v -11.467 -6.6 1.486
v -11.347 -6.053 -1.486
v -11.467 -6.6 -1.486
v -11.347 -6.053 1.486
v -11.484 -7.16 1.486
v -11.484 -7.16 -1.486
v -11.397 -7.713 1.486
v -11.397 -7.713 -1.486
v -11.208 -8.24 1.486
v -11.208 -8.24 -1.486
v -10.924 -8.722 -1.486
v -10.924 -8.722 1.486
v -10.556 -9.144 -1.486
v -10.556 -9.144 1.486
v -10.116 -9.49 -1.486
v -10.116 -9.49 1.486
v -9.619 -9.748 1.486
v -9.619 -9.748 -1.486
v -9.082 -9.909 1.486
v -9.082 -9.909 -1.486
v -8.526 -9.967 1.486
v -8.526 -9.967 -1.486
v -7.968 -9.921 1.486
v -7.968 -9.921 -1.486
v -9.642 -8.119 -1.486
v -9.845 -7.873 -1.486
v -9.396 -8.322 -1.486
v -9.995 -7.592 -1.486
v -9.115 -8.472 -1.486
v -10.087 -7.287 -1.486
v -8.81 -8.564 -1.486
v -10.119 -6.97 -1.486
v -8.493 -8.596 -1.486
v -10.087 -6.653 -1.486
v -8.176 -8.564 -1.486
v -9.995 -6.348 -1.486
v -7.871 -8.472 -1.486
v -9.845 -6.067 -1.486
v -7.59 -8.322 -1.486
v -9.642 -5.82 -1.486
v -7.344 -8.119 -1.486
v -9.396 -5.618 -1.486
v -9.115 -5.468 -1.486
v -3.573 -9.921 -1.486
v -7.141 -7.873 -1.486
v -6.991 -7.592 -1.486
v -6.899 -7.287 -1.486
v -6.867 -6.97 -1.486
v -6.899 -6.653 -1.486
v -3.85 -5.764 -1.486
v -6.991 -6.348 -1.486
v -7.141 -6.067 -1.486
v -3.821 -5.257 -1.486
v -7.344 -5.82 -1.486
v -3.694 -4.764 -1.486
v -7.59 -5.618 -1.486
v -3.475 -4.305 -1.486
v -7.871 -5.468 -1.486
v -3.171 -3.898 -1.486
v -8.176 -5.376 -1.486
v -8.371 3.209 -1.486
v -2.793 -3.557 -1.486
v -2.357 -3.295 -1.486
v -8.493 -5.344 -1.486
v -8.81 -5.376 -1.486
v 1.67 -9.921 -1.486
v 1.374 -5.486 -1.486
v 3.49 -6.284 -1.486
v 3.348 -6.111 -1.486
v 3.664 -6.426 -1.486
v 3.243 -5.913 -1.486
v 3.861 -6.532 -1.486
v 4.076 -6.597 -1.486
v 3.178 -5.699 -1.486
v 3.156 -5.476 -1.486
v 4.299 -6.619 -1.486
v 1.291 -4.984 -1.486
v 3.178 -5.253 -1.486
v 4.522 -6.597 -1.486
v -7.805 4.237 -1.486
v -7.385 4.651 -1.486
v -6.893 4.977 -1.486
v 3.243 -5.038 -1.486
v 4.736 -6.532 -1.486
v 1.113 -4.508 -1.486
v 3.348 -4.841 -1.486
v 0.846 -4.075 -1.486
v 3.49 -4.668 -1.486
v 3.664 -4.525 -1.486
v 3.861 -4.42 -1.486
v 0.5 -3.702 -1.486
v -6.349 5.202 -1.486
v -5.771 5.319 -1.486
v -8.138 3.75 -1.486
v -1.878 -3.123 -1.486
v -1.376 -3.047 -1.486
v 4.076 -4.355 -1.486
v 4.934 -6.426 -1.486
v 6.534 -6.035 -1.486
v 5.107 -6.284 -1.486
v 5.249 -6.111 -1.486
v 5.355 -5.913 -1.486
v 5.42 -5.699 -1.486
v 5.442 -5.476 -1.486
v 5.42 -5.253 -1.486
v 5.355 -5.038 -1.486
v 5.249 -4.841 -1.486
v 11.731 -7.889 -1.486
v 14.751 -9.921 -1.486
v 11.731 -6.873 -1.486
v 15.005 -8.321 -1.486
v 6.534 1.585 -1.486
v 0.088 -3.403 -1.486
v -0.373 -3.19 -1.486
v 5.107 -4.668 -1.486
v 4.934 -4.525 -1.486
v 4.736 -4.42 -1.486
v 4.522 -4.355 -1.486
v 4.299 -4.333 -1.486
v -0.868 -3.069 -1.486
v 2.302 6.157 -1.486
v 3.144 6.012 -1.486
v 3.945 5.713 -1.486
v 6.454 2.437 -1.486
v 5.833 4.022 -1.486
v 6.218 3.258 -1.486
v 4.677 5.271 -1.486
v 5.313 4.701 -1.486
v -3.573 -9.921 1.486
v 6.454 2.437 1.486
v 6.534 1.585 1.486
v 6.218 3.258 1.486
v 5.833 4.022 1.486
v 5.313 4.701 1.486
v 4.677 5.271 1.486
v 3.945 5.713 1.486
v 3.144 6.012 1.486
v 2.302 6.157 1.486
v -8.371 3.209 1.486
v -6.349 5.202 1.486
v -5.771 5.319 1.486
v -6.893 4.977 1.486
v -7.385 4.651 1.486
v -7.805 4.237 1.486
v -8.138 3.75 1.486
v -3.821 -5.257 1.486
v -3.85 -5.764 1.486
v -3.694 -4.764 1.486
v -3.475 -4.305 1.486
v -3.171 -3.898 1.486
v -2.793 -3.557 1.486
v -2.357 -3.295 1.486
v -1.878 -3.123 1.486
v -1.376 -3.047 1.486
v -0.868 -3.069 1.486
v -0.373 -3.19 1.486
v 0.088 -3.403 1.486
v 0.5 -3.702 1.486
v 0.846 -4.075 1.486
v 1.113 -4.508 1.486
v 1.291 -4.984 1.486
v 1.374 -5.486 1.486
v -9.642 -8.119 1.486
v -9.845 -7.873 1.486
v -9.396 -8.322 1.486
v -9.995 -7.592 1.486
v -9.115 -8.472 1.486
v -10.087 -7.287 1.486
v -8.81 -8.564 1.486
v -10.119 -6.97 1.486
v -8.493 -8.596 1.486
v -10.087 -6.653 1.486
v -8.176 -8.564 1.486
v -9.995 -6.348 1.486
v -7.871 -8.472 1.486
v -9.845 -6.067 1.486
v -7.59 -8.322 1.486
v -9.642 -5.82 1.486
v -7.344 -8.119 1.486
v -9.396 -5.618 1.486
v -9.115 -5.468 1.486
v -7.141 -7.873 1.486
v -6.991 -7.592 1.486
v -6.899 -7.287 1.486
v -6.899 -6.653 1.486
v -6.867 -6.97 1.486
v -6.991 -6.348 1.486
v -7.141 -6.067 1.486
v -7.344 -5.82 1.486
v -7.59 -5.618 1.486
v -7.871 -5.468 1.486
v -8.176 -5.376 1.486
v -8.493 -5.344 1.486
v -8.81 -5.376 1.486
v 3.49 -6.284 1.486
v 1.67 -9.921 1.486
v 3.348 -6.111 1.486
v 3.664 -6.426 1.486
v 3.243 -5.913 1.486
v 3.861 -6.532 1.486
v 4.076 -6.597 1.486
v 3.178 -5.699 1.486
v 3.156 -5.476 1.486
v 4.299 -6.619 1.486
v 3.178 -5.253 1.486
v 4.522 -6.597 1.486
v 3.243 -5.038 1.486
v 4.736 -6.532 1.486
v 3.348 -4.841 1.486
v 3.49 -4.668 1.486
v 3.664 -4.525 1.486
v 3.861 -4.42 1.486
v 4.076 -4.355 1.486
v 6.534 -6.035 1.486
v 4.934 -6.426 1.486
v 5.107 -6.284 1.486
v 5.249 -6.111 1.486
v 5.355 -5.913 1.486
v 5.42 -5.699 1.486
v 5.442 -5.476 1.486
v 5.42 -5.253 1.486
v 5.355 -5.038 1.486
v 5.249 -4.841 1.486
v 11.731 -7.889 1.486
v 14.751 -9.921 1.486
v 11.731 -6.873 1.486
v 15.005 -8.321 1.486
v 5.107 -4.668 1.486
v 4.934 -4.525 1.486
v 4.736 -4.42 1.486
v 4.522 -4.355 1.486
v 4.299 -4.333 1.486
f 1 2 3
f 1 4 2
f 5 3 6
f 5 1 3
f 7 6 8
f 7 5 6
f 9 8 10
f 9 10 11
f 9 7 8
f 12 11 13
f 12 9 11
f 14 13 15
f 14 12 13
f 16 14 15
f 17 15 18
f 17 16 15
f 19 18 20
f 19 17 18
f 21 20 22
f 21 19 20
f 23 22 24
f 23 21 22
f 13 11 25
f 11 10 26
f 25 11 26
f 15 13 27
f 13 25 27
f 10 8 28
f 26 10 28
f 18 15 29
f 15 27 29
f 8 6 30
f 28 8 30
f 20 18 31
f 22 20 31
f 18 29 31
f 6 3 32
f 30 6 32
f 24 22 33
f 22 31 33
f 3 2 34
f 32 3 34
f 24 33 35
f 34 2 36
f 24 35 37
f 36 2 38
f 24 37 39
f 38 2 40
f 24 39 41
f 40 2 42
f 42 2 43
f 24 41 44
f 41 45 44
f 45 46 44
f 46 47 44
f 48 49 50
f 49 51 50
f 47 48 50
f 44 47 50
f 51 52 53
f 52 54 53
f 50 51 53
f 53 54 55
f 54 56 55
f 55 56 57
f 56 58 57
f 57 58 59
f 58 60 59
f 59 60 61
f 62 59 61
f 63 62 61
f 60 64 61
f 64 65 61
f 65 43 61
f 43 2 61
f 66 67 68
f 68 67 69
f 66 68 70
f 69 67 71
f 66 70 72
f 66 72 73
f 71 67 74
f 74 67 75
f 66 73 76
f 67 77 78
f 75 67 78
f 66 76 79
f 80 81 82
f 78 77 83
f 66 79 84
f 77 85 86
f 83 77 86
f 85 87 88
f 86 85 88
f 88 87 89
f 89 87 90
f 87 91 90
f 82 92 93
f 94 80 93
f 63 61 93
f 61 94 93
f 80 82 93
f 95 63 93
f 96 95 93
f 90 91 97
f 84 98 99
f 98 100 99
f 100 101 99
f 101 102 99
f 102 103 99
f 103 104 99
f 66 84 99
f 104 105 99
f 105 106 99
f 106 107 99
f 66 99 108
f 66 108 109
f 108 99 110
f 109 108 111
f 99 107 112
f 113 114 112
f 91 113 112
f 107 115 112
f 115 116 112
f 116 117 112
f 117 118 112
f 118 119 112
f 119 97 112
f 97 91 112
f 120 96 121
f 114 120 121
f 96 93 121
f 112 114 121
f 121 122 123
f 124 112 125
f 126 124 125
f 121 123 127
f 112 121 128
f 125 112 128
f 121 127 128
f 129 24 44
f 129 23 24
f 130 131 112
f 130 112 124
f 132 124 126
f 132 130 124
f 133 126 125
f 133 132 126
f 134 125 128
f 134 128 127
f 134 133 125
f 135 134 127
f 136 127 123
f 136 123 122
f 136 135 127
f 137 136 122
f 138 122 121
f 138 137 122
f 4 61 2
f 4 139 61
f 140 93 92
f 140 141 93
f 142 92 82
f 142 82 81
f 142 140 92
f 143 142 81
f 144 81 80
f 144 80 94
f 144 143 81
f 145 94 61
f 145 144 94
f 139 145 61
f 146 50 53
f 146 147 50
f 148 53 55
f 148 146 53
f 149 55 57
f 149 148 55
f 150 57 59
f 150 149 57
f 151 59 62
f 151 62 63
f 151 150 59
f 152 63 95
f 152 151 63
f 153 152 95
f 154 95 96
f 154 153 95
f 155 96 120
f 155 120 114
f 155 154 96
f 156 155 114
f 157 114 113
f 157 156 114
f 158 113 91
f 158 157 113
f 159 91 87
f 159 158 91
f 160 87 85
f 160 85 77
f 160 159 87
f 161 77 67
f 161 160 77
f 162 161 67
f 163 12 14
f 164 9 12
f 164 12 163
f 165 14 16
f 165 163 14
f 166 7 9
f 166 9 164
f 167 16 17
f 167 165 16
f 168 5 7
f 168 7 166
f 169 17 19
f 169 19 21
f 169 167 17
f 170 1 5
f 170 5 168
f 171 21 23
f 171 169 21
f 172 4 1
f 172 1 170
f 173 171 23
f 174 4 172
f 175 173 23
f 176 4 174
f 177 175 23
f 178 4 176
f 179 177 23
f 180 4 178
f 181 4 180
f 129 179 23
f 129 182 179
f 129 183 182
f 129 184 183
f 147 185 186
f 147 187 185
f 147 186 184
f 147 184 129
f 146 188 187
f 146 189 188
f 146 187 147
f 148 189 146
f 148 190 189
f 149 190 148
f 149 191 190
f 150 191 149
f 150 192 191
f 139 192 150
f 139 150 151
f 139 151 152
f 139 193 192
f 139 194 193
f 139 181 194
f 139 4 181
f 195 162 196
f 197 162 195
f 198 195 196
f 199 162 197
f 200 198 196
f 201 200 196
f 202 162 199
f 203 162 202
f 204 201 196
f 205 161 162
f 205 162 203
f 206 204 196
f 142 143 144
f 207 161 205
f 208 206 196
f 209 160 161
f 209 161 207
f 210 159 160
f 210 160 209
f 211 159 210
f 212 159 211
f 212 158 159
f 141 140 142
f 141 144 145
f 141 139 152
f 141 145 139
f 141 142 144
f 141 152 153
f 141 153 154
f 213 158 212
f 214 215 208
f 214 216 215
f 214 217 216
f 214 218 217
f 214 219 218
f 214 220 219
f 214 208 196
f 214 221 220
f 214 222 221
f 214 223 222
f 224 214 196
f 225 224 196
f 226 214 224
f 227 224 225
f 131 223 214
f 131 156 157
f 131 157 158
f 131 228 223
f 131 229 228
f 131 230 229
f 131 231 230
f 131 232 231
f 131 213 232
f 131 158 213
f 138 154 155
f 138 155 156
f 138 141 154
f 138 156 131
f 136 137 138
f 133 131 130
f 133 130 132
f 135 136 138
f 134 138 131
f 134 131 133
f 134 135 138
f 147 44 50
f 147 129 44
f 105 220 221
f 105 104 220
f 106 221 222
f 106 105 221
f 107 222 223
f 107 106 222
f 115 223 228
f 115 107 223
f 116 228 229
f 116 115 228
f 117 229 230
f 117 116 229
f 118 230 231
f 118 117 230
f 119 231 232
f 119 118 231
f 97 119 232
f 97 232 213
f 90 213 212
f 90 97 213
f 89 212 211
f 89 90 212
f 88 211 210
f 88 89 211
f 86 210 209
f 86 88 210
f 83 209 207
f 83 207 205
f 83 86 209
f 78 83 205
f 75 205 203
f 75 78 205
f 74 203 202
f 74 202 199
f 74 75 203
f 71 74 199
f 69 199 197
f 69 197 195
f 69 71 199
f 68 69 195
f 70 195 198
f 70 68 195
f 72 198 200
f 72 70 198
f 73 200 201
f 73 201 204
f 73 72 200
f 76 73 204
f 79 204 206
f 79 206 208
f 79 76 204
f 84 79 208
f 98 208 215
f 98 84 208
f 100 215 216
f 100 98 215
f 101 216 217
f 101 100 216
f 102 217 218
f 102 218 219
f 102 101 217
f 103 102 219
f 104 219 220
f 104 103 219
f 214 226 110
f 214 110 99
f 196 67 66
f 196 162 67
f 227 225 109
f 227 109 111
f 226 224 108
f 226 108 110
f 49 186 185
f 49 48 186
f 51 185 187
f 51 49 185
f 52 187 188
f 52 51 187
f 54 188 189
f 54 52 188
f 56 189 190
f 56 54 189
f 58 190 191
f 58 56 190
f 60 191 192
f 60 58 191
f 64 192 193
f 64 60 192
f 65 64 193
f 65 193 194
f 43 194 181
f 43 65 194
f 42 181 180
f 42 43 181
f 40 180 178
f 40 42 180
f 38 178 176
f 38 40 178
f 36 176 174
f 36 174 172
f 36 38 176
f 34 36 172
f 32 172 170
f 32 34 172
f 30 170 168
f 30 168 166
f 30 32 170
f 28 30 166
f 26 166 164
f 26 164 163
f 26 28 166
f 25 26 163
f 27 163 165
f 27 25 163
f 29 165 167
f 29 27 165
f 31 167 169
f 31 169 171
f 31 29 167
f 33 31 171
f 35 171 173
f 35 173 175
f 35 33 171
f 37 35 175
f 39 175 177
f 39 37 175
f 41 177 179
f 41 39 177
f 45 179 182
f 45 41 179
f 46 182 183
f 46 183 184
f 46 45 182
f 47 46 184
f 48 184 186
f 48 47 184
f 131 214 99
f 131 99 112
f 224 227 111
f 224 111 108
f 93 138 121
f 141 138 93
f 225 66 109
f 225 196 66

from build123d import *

# Parameters (mm, degrees)
SKETCH2_R           = 1.6256
SKETCH2_R_2         = 1.143
BOSS_EXTRUDE1_DEPTH = 1.4859


with BuildPart() as part:
    # Sketch2 → Boss-Extrude1 (new body, symmetric)
    with BuildSketch(Plane.XY):
        with BuildLine():
            Line((1.669588526, -9.920736917), (14.750588526, -9.920736917))
            Line((14.750588526, -9.920736917), (15.004588526, -8.320536917))
            Line((15.004588526, -8.320536917), (11.730740811, -7.888736917))
            Line((11.730740811, -7.888736917), (11.730740811, -6.872736917))
            Line((11.730740811, -6.872736917), (6.533907217, -6.034536917))
            Line((6.533907217, -6.034536917), (6.533907217, 1.585463083))
            ThreePointArc((6.533907217, 1.585463083), (5.31342025, 4.700559773), (2.301635303, 6.157463083))
            Line((2.301635303, 6.157463083), (-5.77059015, 5.319263083))
            ThreePointArc((-5.77059015, 5.319263083), (-7.384864751, 4.650807821), (-8.371334953, 3.208728953))
            Line((-8.371334953, 3.208728953), (-11.346598434, -6.053267424))
            ThreePointArc((-11.346598434, -6.053267424), (-10.750121538, -8.941908183), (-7.96769015, -9.920736917))
            Line((-7.96769015, -9.920736917), (-3.57349015, -9.920736917))
            Line((-3.57349015, -9.920736917), (-3.850300754, -5.764344341))
            ThreePointArc((-3.850300754, -5.764344341), (-1.375609273, -3.046929144), (1.374211357, -5.485561912))
            Line((1.374211357, -5.485561912), (1.669588526, -9.920736917))
        make_face()
        with Locations((-8.493016303, -6.96993359)):
            Circle(SKETCH2_R, mode=Mode.SUBTRACT)
        with Locations((4.298707217, -5.475736917)):
            Circle(SKETCH2_R_2, mode=Mode.SUBTRACT)
    extrude(amount=BOSS_EXTRUDE1_DEPTH, both=True)


solid = part.part
